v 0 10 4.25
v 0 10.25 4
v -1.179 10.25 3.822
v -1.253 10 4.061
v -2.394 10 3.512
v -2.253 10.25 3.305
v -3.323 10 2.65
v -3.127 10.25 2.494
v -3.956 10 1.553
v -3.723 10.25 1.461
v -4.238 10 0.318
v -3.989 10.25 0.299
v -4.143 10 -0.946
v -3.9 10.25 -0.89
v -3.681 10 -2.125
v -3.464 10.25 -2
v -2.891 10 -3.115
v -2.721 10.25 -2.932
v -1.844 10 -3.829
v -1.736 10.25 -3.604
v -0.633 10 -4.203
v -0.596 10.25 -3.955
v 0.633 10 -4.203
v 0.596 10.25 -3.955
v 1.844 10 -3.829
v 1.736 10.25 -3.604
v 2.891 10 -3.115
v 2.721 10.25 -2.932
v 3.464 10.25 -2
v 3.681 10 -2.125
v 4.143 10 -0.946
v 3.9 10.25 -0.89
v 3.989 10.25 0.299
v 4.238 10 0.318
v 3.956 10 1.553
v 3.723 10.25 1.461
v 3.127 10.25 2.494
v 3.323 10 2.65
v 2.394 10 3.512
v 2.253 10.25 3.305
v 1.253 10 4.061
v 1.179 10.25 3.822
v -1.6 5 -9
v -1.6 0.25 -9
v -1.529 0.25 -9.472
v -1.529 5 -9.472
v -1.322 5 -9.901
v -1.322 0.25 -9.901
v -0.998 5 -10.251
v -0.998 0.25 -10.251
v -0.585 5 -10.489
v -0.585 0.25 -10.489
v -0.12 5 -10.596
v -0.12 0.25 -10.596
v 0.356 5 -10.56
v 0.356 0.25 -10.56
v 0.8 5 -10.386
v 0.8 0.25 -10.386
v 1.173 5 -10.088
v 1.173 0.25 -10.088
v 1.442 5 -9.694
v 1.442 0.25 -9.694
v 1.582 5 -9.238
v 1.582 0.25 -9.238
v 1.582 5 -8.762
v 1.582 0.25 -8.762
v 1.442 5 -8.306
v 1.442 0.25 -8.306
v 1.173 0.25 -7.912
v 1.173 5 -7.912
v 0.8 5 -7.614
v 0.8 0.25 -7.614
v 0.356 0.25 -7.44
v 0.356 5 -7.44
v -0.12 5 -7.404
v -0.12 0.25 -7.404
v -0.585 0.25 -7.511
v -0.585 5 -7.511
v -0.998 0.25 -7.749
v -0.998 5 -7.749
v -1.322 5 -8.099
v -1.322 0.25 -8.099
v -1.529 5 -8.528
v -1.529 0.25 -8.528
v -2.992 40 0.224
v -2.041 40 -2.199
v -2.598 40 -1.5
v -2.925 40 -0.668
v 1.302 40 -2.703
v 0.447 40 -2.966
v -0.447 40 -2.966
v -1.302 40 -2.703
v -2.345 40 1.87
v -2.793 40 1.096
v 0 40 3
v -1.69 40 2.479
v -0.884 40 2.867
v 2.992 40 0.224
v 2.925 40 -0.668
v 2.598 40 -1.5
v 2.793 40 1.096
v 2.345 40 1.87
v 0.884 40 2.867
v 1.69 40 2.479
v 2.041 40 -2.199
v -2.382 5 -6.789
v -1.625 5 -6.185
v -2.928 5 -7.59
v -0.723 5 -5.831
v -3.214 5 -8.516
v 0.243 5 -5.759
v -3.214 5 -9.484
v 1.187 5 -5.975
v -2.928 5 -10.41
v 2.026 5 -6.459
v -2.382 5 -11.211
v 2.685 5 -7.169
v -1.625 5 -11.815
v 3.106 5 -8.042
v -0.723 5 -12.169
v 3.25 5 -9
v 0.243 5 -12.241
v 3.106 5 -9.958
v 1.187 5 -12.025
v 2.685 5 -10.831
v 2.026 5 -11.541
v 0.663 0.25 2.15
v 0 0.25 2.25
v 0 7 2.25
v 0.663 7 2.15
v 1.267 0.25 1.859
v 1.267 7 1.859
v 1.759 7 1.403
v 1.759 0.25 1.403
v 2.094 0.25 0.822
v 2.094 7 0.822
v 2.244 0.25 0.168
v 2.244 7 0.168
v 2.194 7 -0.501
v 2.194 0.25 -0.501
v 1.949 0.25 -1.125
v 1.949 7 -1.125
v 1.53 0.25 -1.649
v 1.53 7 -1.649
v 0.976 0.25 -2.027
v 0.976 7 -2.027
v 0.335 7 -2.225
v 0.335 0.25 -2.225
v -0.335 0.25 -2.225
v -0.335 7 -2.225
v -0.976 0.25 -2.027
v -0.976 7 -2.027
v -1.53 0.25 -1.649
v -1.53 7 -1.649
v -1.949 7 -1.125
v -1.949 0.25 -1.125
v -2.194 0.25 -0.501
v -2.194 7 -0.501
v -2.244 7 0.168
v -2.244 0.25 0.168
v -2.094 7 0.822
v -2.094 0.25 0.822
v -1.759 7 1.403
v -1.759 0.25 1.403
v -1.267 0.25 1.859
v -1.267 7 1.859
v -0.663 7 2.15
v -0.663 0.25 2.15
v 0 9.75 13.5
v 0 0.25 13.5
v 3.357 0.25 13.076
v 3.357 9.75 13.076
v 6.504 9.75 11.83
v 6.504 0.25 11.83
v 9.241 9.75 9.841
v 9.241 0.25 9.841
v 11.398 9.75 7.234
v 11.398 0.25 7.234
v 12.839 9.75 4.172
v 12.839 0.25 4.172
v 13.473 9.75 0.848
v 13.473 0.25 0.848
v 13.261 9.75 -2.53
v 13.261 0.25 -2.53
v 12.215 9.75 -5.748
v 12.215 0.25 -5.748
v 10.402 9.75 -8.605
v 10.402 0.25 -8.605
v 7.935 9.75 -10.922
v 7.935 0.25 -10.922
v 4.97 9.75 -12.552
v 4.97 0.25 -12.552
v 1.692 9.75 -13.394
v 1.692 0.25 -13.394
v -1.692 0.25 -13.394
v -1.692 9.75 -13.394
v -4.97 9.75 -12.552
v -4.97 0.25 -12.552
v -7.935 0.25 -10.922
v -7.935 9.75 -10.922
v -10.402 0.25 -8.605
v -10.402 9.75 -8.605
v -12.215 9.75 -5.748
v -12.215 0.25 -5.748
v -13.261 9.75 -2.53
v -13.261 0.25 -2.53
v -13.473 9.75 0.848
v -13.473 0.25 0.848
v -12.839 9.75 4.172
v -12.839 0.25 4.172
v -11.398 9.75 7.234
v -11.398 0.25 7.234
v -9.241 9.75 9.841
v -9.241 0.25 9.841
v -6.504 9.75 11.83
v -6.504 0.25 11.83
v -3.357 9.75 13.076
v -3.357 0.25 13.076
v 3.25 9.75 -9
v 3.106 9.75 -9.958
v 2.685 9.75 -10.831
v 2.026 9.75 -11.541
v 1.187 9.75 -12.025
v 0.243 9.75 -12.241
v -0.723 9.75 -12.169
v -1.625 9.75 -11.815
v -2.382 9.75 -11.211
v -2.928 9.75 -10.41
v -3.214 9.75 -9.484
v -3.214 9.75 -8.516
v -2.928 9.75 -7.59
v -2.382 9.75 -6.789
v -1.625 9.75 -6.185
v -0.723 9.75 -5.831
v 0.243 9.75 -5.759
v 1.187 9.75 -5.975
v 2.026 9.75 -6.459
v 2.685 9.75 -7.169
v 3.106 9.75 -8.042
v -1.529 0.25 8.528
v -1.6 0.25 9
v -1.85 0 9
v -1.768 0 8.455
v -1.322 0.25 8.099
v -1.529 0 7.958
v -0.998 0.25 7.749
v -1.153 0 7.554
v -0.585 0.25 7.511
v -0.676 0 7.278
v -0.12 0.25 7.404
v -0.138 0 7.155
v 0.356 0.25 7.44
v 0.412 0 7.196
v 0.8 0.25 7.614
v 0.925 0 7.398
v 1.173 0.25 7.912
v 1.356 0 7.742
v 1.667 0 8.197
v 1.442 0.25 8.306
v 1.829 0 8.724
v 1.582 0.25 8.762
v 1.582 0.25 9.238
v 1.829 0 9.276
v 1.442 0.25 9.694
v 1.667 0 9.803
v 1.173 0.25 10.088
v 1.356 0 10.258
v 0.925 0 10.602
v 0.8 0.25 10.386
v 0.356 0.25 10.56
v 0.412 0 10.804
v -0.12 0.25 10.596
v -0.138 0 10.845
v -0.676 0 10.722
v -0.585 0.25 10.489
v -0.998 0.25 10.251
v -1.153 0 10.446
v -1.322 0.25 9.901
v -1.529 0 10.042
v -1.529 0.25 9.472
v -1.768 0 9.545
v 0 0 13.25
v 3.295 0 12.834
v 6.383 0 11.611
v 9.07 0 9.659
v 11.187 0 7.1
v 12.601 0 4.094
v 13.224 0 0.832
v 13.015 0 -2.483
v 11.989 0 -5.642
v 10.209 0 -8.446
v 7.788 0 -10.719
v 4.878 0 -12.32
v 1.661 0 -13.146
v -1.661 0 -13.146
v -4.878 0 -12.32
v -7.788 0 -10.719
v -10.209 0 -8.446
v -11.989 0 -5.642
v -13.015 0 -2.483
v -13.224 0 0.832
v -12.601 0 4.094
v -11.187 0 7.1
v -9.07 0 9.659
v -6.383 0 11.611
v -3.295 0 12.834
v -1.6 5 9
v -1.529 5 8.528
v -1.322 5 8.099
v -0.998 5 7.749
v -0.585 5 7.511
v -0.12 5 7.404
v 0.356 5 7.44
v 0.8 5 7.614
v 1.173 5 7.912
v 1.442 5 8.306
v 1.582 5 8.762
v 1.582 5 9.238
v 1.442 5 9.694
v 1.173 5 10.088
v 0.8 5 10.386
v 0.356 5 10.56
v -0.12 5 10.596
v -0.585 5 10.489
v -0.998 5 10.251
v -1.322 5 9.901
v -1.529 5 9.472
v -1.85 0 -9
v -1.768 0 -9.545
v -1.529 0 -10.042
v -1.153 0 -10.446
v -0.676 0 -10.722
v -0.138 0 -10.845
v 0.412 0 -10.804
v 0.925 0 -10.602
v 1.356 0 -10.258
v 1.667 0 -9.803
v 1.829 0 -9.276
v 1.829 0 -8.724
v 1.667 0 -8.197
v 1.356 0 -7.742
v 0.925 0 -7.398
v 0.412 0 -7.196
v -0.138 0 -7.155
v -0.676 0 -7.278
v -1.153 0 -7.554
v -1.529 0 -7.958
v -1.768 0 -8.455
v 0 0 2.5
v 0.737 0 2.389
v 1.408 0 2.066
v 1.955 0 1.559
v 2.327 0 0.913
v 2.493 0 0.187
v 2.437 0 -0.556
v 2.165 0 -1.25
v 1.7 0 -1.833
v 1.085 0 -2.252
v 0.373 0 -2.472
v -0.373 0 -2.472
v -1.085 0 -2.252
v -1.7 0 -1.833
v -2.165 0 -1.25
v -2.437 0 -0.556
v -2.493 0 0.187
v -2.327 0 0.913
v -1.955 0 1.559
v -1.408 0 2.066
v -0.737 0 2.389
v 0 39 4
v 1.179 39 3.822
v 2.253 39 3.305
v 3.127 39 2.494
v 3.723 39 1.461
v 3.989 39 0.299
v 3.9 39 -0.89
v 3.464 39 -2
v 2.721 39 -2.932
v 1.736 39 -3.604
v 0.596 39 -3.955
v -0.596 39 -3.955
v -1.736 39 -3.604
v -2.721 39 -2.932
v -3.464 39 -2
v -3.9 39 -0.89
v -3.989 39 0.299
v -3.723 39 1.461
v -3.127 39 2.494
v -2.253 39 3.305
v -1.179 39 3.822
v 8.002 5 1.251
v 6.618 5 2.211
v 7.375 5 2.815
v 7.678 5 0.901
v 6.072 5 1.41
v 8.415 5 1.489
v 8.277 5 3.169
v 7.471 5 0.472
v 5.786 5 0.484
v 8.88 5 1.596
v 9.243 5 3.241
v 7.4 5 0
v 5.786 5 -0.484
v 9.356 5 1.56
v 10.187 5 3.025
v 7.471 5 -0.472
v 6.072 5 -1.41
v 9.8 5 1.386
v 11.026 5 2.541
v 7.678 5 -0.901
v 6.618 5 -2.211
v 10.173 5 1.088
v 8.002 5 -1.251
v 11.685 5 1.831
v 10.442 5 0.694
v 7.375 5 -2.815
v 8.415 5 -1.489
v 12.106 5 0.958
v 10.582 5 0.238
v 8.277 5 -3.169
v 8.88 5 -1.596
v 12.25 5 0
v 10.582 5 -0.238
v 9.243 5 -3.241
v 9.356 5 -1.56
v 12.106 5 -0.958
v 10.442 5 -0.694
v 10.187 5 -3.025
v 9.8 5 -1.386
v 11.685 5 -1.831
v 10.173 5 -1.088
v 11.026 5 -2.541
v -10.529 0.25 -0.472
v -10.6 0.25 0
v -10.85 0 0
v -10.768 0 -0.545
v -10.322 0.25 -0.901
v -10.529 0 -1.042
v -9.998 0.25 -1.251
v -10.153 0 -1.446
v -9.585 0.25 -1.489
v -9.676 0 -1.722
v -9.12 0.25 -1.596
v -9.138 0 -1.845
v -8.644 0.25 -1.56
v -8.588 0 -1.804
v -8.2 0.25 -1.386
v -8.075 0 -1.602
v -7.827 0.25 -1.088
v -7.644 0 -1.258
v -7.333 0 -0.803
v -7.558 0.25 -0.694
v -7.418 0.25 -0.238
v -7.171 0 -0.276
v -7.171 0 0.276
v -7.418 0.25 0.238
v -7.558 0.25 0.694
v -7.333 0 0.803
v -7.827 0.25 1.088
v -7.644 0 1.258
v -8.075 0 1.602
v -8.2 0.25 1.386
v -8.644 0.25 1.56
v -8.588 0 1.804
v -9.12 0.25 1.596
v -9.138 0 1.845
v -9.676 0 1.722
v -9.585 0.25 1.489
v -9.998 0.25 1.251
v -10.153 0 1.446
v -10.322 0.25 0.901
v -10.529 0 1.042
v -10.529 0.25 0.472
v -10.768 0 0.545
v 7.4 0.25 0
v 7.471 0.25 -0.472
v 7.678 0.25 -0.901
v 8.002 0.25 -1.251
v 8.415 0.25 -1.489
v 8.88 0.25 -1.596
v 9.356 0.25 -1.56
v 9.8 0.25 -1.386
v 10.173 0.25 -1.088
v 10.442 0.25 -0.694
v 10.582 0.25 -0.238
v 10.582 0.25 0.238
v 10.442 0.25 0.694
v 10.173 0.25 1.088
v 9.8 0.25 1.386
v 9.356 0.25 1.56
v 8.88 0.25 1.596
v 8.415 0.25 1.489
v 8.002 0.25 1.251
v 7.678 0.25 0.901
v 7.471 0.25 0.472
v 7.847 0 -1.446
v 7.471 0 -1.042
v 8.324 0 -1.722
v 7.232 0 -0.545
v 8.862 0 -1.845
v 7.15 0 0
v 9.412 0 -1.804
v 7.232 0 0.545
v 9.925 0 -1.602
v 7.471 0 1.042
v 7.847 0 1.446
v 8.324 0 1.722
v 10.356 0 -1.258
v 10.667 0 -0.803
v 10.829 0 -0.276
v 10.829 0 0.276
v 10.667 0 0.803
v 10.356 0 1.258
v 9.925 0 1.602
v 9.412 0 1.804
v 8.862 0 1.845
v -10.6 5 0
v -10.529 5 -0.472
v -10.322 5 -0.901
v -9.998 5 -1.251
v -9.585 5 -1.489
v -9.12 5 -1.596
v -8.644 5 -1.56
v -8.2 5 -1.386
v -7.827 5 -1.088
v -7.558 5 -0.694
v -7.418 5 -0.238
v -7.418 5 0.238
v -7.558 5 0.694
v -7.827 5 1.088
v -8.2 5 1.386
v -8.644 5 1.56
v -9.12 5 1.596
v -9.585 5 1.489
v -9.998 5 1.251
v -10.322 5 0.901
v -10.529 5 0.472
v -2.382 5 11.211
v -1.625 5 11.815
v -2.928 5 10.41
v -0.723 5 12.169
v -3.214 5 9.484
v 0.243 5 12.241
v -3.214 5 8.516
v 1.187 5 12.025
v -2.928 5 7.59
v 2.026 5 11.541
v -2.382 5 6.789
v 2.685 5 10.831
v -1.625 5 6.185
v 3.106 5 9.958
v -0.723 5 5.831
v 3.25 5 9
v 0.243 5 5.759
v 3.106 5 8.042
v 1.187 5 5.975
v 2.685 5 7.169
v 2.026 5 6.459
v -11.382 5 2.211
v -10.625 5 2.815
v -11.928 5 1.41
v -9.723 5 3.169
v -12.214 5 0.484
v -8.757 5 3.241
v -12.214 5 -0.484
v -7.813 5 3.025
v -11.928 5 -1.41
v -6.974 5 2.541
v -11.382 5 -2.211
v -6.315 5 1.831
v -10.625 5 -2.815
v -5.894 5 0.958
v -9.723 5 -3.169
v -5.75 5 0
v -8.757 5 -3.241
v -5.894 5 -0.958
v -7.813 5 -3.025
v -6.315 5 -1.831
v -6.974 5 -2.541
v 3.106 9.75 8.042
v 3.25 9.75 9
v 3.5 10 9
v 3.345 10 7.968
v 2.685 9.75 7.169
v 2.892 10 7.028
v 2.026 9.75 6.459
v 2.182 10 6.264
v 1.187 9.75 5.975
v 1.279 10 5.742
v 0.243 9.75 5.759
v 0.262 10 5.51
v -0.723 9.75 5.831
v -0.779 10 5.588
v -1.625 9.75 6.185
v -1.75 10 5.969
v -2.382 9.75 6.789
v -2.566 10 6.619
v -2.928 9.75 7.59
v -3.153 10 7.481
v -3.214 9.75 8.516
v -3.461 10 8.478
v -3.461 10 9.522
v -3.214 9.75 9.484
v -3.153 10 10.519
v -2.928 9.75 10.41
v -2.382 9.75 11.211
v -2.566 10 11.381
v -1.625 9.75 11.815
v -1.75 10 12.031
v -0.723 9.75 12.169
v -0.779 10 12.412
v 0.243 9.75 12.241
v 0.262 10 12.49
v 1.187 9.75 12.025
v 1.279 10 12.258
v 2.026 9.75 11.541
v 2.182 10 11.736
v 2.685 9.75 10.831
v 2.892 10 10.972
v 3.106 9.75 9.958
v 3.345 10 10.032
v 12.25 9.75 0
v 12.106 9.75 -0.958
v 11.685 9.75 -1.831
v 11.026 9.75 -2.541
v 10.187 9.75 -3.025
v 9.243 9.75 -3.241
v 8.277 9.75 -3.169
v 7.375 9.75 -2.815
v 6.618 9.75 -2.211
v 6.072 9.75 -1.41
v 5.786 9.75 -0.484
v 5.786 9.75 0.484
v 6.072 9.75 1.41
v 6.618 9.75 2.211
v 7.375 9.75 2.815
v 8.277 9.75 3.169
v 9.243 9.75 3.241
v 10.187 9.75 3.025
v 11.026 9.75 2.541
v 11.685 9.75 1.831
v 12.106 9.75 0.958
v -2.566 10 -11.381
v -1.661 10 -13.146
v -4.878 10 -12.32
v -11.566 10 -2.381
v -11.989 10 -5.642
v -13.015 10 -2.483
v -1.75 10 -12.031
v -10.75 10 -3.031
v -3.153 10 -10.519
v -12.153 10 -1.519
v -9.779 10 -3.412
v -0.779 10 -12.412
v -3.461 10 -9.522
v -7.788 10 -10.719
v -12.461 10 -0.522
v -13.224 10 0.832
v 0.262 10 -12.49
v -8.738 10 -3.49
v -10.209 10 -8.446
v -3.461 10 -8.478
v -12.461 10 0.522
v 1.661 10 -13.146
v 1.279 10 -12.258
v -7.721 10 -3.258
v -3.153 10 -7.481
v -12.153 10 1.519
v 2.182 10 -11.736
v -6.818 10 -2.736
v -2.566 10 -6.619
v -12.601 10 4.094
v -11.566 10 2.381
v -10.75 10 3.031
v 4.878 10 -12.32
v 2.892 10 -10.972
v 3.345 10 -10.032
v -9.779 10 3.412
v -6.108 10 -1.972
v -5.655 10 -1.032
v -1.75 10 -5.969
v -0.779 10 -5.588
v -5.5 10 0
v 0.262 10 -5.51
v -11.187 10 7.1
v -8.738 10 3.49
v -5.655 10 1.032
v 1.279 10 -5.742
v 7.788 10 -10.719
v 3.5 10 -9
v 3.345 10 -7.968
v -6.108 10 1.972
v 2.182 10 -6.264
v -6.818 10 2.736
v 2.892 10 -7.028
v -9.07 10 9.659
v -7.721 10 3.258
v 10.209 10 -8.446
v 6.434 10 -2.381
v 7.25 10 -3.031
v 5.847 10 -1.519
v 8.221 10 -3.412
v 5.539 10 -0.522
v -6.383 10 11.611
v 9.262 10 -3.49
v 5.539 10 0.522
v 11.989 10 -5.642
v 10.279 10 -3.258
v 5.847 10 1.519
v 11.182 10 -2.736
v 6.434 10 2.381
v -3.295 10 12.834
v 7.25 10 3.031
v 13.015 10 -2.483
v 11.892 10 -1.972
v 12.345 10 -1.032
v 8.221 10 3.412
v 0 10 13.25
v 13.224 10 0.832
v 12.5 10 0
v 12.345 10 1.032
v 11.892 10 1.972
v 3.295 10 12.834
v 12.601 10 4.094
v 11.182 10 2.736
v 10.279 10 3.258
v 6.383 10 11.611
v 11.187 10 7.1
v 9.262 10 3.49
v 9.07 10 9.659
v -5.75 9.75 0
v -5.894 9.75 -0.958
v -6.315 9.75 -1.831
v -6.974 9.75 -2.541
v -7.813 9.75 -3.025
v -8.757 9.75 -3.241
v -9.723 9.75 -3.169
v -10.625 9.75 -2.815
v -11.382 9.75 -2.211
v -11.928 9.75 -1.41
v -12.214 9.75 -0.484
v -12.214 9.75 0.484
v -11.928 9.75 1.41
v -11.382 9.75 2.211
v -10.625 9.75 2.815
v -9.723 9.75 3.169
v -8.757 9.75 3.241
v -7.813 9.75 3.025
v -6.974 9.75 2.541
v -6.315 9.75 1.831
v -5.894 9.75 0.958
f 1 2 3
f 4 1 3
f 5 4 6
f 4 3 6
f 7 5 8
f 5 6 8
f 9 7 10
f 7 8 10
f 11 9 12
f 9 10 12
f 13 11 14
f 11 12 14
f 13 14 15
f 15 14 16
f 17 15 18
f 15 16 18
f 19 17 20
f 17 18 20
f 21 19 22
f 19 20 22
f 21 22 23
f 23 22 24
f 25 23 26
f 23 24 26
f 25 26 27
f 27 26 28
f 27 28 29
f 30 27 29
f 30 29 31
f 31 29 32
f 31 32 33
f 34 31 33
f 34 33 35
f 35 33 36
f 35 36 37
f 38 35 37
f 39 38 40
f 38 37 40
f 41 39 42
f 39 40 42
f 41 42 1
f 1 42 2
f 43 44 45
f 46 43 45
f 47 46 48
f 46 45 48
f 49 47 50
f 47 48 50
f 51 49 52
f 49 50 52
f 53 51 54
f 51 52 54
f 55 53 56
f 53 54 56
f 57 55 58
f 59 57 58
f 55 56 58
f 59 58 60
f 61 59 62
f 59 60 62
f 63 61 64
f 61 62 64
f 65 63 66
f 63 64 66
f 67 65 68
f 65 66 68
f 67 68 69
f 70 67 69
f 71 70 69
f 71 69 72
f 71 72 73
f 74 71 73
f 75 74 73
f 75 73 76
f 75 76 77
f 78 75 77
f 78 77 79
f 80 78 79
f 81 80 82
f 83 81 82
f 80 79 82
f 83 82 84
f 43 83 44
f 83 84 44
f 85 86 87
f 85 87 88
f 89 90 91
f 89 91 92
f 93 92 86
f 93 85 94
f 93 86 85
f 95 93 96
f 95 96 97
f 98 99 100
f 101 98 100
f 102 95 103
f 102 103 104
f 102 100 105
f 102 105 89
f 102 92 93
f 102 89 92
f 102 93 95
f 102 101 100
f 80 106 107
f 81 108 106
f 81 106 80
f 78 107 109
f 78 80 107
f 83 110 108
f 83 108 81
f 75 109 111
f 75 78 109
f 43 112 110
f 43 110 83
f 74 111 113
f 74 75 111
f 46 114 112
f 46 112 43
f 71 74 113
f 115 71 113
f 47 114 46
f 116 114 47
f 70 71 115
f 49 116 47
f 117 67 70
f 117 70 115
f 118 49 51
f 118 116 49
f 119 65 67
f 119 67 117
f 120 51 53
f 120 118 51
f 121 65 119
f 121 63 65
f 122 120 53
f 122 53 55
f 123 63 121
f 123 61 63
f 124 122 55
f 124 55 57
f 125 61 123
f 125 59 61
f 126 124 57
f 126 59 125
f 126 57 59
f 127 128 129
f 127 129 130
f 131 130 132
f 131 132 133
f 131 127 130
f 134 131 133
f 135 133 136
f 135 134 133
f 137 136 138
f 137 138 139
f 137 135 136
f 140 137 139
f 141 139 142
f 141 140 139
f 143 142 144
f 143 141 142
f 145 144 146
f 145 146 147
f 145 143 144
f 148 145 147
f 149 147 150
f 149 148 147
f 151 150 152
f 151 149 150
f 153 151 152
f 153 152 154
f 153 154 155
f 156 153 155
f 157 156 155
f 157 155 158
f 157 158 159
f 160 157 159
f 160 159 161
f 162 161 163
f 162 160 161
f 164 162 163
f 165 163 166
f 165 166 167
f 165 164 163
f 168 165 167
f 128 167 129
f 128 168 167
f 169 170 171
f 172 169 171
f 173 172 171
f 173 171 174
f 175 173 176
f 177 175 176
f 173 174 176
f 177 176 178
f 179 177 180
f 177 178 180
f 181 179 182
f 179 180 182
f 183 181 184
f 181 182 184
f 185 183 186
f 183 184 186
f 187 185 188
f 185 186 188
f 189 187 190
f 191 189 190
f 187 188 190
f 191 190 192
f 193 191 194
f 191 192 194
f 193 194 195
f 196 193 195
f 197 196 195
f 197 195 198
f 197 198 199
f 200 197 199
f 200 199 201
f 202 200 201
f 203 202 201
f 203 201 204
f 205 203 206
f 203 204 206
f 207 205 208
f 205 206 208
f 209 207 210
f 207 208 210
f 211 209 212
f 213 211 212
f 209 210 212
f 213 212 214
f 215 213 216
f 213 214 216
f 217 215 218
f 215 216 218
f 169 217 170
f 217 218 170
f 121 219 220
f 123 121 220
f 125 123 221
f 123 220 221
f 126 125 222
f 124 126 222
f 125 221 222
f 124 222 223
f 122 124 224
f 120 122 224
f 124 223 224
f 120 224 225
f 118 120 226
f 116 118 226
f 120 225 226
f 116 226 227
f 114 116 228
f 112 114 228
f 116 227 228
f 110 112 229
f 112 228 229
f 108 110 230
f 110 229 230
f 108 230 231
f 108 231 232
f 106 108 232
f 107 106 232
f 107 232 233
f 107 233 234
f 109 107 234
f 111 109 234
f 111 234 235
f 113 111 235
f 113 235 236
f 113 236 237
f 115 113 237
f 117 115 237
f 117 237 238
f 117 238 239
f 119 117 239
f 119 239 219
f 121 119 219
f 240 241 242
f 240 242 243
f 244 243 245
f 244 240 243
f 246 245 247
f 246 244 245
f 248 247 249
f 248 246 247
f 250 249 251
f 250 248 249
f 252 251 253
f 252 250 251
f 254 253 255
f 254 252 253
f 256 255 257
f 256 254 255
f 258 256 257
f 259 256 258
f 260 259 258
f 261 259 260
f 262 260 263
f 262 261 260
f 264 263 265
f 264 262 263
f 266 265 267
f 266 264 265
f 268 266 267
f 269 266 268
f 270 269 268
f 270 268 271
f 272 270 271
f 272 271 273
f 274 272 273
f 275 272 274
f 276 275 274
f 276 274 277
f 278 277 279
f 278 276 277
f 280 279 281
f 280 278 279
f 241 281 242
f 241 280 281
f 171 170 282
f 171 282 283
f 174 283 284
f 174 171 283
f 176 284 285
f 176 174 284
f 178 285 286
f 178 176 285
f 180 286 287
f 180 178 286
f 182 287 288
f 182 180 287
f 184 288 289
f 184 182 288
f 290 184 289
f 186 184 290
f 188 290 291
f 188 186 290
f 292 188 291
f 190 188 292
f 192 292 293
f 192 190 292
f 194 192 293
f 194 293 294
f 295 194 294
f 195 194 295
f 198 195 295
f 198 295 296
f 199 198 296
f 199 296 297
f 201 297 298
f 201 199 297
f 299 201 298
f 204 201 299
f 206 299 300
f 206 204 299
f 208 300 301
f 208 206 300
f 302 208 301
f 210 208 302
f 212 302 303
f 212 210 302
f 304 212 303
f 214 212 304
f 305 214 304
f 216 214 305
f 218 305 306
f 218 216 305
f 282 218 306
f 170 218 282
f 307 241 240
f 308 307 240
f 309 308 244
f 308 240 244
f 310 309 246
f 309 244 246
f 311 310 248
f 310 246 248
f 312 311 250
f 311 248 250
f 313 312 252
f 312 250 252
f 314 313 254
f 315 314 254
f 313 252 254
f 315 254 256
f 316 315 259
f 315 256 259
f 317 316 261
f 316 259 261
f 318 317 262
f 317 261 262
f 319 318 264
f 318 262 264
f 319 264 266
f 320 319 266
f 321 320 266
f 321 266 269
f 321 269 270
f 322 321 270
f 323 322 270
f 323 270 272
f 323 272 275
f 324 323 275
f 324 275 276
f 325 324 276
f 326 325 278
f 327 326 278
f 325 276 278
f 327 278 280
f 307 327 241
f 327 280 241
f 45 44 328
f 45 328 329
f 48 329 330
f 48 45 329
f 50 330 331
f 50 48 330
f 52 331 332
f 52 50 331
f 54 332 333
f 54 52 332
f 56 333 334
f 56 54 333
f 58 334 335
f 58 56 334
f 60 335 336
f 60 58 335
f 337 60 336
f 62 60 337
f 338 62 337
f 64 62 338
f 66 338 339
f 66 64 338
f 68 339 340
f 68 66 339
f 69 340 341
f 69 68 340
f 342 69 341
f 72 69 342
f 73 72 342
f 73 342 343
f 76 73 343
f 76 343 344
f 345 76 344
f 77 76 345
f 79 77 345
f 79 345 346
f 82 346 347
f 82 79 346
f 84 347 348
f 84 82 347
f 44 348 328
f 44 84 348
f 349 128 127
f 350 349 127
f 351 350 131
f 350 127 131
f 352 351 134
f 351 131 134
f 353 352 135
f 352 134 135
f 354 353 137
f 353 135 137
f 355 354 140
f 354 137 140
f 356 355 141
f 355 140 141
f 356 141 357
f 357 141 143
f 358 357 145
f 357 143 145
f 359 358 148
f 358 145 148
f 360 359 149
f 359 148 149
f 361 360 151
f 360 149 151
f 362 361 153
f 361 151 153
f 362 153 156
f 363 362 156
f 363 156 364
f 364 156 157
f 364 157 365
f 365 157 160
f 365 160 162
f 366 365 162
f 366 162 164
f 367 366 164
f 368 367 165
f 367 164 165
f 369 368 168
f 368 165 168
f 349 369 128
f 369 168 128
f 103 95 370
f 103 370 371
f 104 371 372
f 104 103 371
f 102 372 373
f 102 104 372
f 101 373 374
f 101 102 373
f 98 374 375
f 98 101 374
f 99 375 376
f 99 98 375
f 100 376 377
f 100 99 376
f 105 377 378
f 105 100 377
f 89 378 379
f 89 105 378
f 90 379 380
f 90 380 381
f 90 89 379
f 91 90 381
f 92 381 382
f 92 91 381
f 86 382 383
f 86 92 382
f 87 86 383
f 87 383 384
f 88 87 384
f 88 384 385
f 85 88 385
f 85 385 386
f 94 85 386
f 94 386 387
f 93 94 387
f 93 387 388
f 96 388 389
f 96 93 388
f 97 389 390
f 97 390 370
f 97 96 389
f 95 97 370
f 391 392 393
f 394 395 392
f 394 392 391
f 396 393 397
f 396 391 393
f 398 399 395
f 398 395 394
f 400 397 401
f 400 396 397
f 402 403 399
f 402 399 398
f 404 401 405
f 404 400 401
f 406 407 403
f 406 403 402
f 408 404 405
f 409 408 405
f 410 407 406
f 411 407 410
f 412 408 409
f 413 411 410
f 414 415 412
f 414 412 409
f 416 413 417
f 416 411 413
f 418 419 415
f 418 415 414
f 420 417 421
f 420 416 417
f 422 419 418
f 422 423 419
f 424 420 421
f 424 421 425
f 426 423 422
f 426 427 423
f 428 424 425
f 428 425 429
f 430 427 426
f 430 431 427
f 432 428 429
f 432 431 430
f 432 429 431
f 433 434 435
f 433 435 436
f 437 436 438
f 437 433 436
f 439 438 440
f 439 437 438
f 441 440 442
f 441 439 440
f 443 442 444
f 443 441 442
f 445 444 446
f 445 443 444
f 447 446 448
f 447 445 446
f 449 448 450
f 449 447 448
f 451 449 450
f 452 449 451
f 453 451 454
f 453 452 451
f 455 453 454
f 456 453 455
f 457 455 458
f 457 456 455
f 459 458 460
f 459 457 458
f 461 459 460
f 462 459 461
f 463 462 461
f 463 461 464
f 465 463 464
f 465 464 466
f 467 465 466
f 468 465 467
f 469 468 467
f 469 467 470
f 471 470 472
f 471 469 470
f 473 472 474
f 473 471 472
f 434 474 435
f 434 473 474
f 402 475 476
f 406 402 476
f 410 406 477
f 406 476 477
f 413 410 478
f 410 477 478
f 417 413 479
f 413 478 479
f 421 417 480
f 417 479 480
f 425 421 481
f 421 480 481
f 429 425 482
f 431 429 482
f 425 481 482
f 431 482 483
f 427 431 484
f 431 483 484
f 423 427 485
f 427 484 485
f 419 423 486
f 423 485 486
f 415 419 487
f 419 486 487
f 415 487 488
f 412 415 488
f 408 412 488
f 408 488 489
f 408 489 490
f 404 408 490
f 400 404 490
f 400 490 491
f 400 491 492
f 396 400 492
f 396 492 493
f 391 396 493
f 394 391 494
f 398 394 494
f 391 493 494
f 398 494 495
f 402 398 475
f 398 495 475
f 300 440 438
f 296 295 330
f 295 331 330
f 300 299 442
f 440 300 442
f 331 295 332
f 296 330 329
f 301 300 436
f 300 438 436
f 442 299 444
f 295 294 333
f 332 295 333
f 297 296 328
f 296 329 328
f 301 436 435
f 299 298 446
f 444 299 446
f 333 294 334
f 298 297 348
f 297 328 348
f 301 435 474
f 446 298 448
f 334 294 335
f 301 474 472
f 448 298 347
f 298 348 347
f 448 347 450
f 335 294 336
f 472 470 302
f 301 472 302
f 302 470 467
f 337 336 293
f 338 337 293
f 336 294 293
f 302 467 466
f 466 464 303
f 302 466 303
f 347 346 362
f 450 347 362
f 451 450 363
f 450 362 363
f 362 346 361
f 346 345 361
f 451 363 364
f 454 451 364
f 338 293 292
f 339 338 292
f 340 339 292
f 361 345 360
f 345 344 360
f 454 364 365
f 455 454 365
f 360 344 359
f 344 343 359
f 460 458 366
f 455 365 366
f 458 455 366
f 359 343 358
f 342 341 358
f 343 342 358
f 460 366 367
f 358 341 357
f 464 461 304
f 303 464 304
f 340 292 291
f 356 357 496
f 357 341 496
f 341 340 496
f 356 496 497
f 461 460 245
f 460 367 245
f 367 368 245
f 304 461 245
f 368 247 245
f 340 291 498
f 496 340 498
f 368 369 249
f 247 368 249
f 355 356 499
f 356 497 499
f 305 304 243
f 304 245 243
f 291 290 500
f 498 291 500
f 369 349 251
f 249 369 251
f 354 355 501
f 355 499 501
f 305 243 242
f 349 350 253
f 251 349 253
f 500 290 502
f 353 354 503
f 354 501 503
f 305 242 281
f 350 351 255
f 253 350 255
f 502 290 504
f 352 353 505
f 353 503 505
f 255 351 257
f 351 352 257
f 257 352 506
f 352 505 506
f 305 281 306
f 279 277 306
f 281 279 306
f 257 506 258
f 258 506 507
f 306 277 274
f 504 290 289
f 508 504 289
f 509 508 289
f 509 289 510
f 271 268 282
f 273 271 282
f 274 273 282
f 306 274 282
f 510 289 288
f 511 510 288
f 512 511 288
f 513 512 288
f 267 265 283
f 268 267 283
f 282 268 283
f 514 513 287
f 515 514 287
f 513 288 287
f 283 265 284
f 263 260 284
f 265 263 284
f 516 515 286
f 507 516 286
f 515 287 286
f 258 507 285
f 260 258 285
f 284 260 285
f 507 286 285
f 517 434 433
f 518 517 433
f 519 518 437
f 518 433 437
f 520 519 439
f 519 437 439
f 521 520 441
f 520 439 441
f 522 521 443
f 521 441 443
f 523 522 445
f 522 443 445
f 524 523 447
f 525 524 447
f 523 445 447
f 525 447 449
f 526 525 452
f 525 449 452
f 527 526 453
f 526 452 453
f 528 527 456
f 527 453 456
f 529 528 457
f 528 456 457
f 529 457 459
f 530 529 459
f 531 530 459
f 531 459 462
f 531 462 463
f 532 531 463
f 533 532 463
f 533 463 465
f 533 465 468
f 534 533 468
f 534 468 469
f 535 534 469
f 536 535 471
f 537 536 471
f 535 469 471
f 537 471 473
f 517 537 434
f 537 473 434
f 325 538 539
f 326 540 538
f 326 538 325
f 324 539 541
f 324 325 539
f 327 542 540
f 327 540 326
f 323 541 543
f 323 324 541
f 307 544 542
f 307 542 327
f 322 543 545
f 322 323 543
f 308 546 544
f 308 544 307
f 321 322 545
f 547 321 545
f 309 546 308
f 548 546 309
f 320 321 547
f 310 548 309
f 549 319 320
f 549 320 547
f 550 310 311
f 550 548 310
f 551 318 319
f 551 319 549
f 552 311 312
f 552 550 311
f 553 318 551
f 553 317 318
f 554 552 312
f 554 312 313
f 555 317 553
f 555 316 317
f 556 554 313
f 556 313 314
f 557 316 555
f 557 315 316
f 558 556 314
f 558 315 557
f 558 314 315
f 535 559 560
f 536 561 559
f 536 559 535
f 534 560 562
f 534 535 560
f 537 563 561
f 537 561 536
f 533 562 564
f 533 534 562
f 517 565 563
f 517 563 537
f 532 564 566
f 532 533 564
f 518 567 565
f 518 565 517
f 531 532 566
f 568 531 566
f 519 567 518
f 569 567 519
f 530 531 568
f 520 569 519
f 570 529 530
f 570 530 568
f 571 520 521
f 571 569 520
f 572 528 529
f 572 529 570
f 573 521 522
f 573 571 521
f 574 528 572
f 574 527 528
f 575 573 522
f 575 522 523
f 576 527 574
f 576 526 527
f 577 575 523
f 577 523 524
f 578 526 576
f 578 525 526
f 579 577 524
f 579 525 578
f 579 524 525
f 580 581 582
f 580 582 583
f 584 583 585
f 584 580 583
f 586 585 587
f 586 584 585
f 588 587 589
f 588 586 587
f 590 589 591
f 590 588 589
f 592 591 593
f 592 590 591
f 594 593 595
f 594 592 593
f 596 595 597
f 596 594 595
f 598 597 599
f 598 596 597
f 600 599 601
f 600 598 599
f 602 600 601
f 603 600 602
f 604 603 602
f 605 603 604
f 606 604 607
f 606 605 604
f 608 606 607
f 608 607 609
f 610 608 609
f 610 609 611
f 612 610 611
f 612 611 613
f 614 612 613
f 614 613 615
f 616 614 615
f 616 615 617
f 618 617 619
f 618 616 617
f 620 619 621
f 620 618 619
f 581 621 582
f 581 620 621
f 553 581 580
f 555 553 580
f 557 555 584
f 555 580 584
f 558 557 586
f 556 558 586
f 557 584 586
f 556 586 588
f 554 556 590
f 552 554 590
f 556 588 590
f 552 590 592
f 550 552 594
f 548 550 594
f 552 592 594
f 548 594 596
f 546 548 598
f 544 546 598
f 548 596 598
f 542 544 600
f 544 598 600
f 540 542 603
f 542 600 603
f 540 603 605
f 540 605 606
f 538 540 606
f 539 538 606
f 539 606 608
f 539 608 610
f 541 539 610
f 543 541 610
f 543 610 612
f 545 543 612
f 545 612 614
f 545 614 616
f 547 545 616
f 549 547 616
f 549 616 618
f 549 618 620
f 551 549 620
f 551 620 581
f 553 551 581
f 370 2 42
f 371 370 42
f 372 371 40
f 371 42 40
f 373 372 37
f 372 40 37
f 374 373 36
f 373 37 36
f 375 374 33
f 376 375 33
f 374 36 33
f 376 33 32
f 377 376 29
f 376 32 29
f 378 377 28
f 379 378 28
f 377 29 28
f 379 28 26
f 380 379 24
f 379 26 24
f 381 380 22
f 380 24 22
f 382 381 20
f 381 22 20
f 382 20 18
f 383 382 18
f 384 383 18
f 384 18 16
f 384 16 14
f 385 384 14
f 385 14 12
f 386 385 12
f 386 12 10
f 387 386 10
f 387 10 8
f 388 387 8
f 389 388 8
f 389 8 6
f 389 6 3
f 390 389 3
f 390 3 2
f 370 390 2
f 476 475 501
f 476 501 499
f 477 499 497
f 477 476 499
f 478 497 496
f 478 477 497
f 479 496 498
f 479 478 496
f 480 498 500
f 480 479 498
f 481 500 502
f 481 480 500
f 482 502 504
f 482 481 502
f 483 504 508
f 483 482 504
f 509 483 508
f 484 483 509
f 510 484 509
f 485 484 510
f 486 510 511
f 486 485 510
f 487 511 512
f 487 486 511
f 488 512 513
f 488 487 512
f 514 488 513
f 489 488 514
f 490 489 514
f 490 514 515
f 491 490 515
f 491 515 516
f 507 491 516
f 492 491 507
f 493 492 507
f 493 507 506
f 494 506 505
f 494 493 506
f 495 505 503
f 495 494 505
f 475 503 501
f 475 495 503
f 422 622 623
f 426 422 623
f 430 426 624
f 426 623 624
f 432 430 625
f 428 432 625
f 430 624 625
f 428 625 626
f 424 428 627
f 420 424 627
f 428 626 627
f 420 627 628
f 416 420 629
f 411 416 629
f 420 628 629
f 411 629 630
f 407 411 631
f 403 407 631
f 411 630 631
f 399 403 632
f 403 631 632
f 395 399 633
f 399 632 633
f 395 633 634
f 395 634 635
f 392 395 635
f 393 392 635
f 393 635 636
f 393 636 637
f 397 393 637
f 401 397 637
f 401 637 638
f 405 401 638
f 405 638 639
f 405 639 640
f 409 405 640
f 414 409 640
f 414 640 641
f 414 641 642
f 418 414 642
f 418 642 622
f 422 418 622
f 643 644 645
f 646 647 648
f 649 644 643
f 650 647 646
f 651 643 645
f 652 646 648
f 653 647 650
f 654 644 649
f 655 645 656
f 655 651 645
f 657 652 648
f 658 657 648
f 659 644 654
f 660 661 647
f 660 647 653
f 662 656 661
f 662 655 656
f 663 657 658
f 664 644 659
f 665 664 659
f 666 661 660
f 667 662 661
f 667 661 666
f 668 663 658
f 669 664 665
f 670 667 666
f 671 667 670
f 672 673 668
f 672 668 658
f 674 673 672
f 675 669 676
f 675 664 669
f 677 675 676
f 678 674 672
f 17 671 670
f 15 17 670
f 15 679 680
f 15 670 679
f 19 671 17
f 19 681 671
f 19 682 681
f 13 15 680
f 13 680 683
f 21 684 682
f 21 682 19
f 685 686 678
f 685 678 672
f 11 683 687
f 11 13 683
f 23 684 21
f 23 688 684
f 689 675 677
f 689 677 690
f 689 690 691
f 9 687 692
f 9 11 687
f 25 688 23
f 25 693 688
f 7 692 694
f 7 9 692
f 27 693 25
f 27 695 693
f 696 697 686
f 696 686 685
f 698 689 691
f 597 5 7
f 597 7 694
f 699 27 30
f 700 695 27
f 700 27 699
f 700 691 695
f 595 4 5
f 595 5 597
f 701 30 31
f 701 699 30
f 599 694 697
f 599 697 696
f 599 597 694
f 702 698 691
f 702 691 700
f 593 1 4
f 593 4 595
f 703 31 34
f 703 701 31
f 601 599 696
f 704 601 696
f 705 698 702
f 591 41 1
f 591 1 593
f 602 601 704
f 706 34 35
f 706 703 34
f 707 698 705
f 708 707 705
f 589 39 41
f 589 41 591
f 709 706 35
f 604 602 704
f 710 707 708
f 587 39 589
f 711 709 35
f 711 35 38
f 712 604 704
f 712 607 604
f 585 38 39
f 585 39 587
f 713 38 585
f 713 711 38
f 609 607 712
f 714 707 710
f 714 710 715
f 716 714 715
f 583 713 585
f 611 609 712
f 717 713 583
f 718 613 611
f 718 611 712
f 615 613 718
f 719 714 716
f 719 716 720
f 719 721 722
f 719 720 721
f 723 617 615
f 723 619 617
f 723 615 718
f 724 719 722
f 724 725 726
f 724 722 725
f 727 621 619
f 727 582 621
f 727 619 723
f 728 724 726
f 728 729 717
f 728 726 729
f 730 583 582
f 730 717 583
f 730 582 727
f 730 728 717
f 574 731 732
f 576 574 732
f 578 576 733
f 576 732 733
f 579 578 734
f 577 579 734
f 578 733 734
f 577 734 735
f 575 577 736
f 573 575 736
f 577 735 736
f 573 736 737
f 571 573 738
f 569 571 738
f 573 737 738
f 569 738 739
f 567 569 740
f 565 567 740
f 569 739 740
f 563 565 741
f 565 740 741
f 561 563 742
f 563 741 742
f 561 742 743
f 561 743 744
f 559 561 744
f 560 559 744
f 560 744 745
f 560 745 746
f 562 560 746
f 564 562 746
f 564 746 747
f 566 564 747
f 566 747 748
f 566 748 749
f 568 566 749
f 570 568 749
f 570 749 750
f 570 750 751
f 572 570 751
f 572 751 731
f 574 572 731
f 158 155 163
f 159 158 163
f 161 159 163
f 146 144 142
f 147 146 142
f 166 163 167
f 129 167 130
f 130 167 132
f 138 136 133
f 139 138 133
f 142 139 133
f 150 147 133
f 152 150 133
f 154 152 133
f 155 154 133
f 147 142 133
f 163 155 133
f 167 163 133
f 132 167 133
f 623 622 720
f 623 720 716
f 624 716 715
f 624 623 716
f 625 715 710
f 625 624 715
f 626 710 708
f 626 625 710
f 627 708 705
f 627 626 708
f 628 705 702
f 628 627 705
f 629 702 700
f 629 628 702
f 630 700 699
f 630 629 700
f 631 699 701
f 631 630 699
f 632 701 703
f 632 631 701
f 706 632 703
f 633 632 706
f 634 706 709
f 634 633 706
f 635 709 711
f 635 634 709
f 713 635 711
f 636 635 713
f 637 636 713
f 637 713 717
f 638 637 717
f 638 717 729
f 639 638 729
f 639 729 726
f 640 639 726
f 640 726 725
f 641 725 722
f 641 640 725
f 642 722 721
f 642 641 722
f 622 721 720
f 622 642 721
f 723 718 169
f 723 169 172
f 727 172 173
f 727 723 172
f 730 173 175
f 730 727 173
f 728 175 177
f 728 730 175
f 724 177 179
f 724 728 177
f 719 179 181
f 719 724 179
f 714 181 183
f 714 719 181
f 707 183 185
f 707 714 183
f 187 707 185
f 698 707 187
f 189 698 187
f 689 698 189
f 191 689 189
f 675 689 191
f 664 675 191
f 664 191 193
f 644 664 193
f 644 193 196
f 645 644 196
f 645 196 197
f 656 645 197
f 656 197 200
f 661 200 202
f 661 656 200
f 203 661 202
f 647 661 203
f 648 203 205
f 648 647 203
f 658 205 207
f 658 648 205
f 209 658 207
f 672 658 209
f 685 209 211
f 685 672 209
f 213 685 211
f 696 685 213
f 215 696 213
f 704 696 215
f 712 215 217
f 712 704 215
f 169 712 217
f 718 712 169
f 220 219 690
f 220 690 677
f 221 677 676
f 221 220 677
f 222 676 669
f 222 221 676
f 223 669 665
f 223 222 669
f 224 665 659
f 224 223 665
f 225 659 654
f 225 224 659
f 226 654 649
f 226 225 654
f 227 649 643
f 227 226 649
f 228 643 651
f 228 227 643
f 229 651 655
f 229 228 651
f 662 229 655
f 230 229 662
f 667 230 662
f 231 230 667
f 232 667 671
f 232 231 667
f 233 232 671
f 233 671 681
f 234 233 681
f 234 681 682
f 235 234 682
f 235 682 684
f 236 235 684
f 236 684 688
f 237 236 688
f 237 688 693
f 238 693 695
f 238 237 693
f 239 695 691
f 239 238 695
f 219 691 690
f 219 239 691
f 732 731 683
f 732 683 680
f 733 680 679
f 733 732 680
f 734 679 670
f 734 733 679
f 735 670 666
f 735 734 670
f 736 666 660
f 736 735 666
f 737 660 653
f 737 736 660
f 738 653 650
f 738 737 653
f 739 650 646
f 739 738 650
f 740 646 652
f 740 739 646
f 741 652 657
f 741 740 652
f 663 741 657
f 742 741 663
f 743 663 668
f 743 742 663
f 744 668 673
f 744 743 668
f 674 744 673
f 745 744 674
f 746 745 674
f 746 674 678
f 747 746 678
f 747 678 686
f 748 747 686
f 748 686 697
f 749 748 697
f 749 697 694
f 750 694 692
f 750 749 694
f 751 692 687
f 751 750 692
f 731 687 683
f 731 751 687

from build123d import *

# Parameters (mm, degrees)
SKETCH2_R                      = 13.5
BOSS_EXTRUDE1_DEPTH            = 10
SKETCH3_R                      = 4
BOSS_EXTRUDE2_DEPTH            = 40
CBORE_FOR_M3_SHCS1_D           = 3.2
CBORE_FOR_M3_SHCS1_CBORE_D     = 6.5
CBORE_FOR_M3_SHCS1_CBORE_DEPTH = 5
SKETCH10_R                     = 2.25
CUT_EXTRUDE3_DEPTH             = 7
CHAMFER1_SIZE                  = 0.25
CHAMFER2_SIZE                  = 1


with BuildPart() as part:
    # Sketch2 → Boss-Extrude1 (new body)
    with BuildSketch(Plane(origin=(0, 0, 0), x_dir=(1, 0, 0), z_dir=(0, 1, 0))):
        with Locations(Location((0, 0, 0), (0, 0, 270))):
            Circle(SKETCH2_R)
    extrude(amount=BOSS_EXTRUDE1_DEPTH)

    # Sketch3 → Boss-Extrude2 (add)
    with BuildSketch(Plane(origin=(0, 0, 0), x_dir=(1, 0, 0), z_dir=(0, 1, 0))):
        with Locations(Location((0, 0, 0), (0, 0, 270))):
            Circle(SKETCH3_R)
    extrude(amount=BOSS_EXTRUDE2_DEPTH)

    # CBORE for M3 SHCS1 (through all)
    with Locations(Plane(origin=(0, 10, 0), x_dir=(1, 0, 0), z_dir=(0, 1, 0))):
        with Locations((-9, 0), (9, 0), (0, 9), (0, -9)):
            CounterBoreHole(CBORE_FOR_M3_SHCS1_D / 2, CBORE_FOR_M3_SHCS1_CBORE_D / 2, CBORE_FOR_M3_SHCS1_CBORE_DEPTH)

    # Sketch10 → Cut-Extrude3 (cut)
    with BuildSketch(Plane(origin=(0, 0, 0), x_dir=(1, 0, 0), z_dir=(0, 1, 0))):
        with Locations(Location((0, 0, 0), (0, 0, 270))):
            Circle(SKETCH10_R)
    extrude(amount=CUT_EXTRUDE3_DEPTH, mode=Mode.SUBTRACT)

    # Chamfer1
    chamfer1_edges = [part.edges().sort_by_distance(p)[0] for p in [
        (-3.25, 10, 9),
        (0, 0, -13.5),
        (1.6, 0, 9),
        (5.75, 10, 0),
        (10.6, 0, 0),
        (-3.25, 10, -9),
        (1.6, 0, -9),
        (-12.25, 10, 0),
        (-7.4, 0, 0),
        (0, 10, -13.5),
        (0, 0, -2.25),
        (0, 10, -4),
    ]]
    chamfer(chamfer1_edges, length=CHAMFER1_SIZE)

    # Chamfer2
    chamfer2_edges = [part.edges().sort_by_distance(p)[0] for p in [
        (0, 40, -4),
    ]]
    chamfer(chamfer2_edges, length=CHAMFER2_SIZE)


solid = part.part
